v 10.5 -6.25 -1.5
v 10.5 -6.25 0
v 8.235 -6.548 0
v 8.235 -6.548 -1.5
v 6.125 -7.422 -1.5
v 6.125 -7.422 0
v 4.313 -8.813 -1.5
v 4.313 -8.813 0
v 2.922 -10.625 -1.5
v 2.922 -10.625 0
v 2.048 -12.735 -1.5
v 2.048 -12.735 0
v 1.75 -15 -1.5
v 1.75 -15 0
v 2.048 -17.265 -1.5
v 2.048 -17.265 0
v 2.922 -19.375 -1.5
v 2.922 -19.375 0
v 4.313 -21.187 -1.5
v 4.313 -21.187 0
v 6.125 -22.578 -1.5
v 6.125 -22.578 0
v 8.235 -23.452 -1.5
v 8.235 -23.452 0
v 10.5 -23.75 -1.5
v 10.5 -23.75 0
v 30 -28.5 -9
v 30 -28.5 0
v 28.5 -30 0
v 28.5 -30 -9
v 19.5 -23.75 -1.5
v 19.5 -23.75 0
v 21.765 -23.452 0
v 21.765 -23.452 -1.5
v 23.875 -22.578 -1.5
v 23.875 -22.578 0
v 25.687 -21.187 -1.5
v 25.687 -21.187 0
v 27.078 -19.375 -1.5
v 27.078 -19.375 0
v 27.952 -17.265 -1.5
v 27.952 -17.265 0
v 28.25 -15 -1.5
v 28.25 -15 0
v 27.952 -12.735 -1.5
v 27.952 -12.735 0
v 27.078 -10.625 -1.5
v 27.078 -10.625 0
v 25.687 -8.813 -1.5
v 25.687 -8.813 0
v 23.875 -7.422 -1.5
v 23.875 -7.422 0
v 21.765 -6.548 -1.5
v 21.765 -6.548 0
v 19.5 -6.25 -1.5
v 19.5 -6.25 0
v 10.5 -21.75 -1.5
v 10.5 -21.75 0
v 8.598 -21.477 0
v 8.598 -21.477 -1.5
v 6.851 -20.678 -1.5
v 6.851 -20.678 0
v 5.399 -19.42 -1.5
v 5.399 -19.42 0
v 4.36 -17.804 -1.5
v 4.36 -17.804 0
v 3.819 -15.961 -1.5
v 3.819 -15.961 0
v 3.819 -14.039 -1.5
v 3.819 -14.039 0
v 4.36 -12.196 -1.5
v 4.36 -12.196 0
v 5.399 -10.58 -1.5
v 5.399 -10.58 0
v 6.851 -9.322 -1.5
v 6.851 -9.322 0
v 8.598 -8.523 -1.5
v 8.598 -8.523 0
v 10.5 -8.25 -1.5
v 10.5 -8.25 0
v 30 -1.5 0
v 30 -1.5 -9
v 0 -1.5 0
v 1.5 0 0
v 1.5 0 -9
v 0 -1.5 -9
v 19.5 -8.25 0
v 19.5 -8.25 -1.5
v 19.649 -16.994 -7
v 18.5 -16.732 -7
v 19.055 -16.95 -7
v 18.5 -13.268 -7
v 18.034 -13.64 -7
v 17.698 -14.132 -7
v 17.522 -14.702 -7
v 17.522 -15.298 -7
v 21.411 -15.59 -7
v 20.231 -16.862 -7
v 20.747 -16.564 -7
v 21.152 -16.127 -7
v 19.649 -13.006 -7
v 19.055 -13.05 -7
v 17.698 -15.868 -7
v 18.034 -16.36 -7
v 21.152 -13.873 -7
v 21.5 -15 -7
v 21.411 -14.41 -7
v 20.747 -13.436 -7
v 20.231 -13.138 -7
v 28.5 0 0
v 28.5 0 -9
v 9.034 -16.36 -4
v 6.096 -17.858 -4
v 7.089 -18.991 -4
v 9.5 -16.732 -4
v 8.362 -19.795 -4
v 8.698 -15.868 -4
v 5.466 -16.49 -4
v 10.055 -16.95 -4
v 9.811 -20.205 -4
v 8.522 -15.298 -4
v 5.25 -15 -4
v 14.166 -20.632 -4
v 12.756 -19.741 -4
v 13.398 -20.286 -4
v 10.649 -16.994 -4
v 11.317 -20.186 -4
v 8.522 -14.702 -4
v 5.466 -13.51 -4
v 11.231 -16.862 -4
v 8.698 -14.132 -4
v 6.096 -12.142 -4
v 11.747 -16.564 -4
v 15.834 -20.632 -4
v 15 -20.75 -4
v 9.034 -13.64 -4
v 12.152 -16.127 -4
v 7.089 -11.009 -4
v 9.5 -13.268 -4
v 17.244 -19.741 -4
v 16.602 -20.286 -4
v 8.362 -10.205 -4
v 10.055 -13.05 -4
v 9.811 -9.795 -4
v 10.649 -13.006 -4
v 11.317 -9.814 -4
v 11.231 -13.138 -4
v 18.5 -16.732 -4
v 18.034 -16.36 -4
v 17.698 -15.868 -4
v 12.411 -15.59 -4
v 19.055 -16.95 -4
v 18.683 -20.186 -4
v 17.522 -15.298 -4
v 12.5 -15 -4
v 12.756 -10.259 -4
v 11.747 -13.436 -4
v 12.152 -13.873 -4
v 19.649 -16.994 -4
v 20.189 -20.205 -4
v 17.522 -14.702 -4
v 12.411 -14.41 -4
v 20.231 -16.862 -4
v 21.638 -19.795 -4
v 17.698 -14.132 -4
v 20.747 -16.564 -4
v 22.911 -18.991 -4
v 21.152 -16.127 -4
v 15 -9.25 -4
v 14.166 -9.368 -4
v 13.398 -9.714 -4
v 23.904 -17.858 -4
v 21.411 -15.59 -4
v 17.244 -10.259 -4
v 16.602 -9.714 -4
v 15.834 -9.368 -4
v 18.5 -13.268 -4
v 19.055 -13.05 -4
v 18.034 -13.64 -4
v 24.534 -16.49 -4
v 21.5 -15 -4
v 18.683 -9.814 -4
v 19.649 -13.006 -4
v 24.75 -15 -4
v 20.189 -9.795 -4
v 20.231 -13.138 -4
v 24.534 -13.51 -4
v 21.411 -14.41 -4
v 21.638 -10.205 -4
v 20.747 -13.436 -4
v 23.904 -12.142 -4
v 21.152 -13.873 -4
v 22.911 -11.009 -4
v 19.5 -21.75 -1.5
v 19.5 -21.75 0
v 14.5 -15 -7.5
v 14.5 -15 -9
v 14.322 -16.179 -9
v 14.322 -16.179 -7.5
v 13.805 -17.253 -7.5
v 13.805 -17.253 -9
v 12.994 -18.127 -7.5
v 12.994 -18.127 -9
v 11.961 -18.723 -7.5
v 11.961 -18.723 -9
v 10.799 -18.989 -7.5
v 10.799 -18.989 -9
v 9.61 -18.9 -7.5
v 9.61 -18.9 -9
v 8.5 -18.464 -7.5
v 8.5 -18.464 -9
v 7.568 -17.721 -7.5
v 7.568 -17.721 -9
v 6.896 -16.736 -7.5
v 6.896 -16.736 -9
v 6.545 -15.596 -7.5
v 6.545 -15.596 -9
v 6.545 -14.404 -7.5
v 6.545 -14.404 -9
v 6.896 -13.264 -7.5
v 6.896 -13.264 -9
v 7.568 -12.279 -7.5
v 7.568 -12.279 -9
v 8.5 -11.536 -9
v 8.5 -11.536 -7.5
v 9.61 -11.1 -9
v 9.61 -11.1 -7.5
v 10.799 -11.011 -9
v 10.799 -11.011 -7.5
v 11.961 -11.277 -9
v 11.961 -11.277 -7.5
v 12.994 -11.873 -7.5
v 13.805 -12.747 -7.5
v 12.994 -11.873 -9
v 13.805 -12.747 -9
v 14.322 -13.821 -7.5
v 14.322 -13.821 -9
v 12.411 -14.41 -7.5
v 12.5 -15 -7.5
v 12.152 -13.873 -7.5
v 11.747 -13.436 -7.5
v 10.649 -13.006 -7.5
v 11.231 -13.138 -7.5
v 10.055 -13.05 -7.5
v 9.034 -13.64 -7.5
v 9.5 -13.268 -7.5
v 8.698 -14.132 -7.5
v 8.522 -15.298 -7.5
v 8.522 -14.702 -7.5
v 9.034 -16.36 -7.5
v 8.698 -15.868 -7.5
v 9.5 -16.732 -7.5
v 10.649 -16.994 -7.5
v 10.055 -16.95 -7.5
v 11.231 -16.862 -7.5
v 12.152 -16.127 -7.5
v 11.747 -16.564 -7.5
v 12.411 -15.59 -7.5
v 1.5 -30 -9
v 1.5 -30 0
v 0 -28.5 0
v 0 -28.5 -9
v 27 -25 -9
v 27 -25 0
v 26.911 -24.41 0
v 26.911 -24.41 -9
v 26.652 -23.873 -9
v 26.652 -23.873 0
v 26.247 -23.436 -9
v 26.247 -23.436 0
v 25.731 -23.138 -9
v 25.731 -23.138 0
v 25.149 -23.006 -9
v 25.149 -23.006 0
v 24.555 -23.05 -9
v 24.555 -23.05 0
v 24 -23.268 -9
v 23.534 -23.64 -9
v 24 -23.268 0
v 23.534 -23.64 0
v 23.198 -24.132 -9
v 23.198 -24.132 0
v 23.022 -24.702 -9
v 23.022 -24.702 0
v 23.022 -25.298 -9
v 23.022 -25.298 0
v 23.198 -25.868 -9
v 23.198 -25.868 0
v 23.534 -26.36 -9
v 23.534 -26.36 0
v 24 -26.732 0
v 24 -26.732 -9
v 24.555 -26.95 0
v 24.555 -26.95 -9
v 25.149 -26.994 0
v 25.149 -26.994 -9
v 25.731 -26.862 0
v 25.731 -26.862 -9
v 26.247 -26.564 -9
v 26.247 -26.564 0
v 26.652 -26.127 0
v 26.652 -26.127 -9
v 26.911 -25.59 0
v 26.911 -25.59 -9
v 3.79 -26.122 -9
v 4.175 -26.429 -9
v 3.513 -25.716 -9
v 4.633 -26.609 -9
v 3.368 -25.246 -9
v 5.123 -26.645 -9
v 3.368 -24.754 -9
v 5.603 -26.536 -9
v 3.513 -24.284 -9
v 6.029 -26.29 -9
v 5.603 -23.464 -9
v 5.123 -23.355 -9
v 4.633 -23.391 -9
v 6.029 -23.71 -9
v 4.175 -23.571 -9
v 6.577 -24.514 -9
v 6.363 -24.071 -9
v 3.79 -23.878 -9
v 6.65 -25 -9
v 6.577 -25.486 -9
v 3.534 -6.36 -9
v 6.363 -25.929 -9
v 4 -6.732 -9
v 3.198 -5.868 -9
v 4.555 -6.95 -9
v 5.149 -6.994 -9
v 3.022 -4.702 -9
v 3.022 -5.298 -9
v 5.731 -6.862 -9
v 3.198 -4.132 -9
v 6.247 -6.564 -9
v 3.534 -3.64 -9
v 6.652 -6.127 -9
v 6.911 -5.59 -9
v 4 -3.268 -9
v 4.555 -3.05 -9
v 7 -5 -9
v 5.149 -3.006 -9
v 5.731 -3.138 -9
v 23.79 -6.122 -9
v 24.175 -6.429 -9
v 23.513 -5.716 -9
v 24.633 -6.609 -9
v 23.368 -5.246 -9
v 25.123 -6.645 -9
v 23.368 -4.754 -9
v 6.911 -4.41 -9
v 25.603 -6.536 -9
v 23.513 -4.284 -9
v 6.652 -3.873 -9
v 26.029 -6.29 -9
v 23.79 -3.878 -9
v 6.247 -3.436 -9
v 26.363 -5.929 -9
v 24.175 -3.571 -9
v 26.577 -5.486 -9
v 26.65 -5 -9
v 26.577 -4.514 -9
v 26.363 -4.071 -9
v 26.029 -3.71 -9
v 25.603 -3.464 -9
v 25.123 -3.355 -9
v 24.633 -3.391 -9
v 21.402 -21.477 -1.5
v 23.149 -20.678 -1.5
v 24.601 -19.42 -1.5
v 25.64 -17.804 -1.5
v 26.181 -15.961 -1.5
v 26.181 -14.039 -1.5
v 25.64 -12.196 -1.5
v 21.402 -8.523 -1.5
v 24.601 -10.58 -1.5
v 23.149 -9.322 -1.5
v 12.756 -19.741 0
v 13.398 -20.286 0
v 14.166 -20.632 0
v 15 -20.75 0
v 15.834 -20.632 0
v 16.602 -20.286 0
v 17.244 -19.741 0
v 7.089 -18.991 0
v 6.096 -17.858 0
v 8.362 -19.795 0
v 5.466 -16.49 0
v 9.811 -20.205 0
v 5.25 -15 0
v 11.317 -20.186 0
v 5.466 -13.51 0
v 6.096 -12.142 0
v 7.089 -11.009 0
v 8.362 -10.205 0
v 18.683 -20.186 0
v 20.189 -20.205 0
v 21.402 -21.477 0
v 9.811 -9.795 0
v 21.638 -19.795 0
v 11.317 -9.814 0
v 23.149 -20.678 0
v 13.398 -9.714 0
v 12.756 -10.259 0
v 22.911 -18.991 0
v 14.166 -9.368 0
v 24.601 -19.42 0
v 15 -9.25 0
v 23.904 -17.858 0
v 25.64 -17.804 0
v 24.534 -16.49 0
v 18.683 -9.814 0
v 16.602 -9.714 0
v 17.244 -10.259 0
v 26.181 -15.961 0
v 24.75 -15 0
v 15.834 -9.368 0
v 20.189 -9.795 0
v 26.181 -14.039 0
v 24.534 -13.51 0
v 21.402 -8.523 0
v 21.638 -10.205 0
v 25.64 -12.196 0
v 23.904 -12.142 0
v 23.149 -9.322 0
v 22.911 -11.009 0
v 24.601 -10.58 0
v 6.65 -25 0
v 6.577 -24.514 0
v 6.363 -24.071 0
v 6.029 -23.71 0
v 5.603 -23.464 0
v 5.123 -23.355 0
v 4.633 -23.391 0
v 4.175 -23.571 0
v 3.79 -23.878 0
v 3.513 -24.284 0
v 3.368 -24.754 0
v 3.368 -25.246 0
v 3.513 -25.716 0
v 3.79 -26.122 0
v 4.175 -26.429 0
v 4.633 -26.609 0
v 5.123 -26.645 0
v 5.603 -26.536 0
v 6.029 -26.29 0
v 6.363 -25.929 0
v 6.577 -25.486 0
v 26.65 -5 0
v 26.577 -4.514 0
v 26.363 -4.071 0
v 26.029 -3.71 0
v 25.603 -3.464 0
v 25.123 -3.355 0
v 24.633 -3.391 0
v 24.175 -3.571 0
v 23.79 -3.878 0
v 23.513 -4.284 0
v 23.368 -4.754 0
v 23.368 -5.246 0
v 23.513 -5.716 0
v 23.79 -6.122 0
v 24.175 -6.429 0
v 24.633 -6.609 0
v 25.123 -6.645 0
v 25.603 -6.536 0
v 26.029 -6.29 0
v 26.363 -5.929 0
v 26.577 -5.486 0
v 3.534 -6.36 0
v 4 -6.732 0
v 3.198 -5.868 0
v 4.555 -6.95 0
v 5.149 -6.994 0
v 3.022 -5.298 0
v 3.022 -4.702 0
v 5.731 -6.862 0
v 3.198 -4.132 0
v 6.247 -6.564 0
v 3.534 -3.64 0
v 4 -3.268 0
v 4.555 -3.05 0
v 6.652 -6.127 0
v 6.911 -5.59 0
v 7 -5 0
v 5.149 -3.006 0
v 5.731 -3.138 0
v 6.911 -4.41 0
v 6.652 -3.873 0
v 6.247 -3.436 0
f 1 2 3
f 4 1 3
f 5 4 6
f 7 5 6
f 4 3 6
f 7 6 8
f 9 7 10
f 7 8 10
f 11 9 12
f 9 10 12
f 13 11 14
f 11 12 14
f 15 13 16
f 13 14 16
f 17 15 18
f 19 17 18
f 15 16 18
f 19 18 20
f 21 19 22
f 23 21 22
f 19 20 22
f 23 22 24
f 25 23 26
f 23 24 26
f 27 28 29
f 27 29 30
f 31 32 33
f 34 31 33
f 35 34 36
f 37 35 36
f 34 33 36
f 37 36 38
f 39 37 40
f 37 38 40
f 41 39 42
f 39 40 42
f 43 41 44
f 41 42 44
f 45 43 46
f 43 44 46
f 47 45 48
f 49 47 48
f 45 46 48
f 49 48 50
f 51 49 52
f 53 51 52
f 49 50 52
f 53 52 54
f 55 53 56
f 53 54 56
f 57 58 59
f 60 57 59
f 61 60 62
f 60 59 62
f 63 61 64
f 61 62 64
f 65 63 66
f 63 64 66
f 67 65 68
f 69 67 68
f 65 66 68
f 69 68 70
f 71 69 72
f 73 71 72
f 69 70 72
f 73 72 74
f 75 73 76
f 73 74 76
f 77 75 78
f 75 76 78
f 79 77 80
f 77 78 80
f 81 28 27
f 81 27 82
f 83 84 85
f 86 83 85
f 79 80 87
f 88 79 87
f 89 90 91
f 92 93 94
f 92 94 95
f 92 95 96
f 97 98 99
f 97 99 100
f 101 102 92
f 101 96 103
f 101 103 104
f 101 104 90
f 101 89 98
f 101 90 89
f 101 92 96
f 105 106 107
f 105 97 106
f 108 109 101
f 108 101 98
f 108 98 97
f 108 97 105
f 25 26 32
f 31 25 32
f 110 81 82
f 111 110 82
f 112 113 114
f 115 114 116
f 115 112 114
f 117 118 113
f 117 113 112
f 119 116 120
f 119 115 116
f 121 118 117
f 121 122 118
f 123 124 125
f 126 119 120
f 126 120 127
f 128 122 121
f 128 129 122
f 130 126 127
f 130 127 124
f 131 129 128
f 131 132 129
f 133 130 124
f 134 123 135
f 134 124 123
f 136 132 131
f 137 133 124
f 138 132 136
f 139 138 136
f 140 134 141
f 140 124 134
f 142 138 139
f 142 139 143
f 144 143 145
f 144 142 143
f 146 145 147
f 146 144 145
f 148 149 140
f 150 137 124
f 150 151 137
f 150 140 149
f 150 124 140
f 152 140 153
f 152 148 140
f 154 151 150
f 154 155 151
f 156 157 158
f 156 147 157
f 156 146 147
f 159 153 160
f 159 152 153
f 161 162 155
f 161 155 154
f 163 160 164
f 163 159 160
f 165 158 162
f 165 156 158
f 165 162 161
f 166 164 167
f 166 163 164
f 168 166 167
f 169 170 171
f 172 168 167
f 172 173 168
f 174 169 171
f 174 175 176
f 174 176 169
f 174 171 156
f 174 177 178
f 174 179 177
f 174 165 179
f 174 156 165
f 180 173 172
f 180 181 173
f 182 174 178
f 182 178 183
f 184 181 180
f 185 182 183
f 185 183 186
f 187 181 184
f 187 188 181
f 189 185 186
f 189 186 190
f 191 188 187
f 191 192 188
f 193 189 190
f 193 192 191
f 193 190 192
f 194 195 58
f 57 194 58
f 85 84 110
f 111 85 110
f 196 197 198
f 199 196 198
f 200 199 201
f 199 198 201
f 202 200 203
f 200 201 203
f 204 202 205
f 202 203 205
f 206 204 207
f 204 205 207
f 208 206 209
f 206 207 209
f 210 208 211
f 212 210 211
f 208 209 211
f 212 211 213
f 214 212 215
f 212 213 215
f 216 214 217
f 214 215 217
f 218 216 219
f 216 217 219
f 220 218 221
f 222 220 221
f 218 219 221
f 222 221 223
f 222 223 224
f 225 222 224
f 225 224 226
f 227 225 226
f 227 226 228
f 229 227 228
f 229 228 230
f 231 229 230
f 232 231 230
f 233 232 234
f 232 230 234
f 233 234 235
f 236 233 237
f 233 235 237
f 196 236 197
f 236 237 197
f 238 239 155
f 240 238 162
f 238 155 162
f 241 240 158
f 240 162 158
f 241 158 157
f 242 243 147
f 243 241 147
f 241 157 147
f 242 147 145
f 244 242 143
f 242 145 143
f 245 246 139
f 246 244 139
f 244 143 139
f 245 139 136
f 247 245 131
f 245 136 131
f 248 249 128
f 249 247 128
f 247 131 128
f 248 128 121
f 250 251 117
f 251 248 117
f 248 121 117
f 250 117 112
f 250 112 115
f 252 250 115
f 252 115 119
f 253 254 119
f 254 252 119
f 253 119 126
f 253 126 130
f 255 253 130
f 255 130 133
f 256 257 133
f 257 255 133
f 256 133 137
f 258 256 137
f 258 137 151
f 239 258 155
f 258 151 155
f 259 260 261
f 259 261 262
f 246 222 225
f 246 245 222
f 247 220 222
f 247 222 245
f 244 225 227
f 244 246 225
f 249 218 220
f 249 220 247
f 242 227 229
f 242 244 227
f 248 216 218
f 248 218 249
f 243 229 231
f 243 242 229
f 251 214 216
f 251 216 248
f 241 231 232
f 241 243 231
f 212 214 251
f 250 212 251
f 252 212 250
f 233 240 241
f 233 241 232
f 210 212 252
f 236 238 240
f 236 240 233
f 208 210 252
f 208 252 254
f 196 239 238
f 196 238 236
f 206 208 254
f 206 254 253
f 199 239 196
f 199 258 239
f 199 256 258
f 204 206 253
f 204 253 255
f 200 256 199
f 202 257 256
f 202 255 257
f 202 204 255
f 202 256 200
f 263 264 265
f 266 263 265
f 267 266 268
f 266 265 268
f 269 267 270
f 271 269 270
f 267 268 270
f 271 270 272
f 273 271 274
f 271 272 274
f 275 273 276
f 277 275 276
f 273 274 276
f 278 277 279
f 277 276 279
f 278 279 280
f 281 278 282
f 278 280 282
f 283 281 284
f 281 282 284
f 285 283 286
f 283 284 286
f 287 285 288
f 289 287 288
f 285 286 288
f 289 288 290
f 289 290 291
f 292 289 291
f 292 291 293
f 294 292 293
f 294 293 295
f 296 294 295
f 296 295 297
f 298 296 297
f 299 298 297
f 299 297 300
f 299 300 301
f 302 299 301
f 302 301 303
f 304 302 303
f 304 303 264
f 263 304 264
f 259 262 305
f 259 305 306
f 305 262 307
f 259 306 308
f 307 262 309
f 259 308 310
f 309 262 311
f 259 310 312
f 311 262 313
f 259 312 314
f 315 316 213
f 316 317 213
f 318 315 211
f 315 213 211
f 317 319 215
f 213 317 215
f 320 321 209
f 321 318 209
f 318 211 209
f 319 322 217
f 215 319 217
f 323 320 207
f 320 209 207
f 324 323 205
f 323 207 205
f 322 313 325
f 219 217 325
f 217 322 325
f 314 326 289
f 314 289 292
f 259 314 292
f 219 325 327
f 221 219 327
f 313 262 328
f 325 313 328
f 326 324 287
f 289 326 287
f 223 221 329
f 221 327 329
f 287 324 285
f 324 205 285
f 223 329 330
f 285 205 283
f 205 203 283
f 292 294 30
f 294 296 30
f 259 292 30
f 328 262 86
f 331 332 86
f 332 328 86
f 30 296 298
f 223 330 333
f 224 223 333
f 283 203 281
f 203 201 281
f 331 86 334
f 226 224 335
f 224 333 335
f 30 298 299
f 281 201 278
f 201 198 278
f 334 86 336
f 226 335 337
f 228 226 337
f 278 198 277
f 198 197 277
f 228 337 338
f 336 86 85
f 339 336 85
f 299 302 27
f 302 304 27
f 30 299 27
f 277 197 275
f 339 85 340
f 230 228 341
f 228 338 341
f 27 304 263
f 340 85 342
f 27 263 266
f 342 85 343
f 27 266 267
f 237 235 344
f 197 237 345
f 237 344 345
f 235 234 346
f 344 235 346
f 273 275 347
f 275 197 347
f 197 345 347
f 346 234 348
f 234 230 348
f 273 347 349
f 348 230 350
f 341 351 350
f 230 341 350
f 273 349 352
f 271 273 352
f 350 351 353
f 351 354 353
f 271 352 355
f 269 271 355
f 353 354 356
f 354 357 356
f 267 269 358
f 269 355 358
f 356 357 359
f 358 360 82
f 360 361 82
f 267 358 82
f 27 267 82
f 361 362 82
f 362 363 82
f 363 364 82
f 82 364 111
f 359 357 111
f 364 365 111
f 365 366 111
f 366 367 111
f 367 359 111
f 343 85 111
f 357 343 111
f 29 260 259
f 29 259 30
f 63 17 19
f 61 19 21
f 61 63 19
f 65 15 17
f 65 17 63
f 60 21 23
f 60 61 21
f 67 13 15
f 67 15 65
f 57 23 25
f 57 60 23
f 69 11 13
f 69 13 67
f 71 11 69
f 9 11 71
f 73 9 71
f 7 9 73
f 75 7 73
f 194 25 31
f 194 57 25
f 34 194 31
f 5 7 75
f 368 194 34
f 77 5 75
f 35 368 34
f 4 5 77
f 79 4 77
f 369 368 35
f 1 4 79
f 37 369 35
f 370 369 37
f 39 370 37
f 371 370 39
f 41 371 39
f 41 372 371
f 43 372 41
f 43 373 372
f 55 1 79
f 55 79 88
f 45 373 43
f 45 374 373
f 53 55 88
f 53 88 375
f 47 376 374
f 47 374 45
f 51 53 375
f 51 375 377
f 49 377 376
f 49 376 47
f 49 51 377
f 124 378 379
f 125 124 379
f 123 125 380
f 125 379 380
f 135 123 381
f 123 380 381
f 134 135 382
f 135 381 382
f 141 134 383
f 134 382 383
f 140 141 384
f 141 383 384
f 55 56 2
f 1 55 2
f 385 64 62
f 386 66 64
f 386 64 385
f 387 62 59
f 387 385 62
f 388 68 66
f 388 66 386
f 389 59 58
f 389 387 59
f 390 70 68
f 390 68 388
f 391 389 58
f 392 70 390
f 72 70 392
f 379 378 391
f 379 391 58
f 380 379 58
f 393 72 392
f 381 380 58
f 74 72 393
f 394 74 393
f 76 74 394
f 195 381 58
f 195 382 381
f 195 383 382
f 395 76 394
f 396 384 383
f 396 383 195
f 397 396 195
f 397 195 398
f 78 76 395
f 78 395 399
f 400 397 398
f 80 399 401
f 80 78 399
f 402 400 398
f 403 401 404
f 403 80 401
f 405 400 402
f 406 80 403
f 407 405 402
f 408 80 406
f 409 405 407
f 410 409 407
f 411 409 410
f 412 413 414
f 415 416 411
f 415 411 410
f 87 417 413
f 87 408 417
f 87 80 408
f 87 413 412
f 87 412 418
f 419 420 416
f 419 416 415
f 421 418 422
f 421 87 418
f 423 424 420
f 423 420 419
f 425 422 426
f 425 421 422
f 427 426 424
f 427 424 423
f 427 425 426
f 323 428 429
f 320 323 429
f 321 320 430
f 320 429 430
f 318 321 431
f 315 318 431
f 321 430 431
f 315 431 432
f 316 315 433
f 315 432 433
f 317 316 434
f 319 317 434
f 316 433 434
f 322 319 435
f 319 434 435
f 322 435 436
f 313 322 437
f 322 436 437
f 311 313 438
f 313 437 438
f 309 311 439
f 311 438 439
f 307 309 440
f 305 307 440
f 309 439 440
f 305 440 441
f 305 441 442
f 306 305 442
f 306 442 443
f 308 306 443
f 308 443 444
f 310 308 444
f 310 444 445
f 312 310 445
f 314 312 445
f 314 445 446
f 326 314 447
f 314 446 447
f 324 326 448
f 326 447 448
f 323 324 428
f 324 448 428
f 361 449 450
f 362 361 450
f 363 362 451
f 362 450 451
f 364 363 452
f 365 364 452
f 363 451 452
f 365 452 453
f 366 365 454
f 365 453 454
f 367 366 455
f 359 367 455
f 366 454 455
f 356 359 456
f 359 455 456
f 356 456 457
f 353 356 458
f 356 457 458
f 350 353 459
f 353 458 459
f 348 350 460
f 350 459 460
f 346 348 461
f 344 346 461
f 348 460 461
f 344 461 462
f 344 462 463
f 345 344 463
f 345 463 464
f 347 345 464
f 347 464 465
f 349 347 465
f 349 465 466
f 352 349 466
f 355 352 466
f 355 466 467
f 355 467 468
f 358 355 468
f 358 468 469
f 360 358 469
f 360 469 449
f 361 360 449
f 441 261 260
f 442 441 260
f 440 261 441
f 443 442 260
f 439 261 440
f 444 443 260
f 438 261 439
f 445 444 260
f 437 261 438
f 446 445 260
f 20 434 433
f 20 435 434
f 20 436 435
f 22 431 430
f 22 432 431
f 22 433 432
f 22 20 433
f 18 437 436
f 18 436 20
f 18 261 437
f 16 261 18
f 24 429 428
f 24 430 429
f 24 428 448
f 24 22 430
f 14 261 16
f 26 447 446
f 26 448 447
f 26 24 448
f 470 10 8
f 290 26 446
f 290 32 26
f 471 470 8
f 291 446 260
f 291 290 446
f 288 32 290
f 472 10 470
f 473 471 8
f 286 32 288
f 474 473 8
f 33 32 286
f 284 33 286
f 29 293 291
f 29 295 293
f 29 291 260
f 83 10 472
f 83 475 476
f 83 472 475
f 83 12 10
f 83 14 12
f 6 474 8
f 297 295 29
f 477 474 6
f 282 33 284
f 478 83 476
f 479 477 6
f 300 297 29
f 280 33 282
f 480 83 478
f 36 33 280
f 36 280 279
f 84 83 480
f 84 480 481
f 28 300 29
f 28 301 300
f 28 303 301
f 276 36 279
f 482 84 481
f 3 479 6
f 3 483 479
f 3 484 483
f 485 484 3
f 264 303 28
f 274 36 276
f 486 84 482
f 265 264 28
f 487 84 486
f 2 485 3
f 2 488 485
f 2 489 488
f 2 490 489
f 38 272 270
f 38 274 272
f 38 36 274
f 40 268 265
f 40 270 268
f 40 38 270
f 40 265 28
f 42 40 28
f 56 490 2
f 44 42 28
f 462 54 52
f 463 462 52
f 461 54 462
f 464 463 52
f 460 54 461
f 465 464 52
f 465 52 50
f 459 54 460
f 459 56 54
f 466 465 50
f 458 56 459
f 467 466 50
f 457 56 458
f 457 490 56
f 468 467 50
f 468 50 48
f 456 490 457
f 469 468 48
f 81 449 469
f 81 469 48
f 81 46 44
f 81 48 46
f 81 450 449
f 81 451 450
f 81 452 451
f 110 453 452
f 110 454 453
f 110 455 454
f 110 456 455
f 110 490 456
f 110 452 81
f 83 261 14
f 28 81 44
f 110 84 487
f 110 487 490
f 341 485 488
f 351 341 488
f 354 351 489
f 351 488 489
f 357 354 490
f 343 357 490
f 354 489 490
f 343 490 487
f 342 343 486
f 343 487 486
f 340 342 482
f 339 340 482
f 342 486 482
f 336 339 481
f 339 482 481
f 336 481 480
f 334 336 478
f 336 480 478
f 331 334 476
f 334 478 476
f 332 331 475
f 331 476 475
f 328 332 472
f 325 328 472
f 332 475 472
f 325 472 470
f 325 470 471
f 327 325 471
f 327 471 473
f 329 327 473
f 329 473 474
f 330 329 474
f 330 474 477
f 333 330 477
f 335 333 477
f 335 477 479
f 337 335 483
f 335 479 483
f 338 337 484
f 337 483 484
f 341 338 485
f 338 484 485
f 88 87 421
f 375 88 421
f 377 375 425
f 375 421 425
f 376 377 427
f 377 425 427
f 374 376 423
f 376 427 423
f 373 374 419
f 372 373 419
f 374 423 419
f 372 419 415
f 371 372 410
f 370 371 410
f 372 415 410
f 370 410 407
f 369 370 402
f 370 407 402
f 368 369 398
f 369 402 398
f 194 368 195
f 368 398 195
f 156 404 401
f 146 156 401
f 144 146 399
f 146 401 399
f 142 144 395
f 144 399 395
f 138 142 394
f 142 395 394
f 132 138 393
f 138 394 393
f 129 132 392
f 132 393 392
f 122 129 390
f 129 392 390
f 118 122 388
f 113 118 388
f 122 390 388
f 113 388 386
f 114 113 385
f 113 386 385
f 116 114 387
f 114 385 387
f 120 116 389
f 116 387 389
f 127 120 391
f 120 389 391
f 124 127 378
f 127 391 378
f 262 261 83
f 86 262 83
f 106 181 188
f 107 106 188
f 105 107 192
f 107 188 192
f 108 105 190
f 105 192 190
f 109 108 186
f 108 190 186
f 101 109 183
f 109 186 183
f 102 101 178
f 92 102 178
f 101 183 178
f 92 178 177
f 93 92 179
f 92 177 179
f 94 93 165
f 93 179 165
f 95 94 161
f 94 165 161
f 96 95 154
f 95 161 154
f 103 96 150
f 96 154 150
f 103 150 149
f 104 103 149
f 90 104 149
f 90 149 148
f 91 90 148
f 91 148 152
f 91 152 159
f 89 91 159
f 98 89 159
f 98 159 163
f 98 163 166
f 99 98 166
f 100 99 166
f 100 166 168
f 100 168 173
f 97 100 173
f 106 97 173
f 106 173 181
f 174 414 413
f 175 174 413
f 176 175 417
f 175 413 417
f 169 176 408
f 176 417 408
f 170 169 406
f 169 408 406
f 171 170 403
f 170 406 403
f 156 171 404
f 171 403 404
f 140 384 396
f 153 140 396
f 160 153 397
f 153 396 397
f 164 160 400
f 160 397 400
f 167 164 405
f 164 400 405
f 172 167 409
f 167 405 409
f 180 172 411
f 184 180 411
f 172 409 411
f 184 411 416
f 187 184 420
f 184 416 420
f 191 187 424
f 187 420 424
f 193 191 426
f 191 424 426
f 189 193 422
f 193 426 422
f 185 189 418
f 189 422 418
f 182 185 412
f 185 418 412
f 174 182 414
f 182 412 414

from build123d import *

# Parameters (mm, degrees)
F0_W     = 30
F0_H     = 30
F0_R     = 1.65
F0_R_2   = 2
F1_DEPTH = 9
F2_DEPTH = 1.5
F3_DEPTH = 7
F4_DEPTH = 4
F5_R     = 4
F5_R_2   = 2
F6_DEPTH = 1.5
F7_DEPTH = 10
F8_SIZE  = 1.5


# Not quite as in the source:
# - a feature names something its author has since deleted; it is built from what else it names


with BuildPart() as f1:
    # F0 (on Top) → F1 (new body)
    with BuildSketch(Plane.XY):
        with Locations((15, -15)):
            Rectangle(F0_W, F0_H)
        with Locations((5, -25)):
            Circle(F0_R, mode=Mode.SUBTRACT)
        with Locations((25, -25)):
            Circle(F0_R_2, mode=Mode.SUBTRACT)
        with Locations((5, -5)):
            Circle(F0_R_2, mode=Mode.SUBTRACT)
        with BuildLine():
            Line((19.5, -23.75), (10.5, -23.75))
            ThreePointArc((10.5, -23.75), (1.75, -15), (10.5, -6.25))
            Line((10.5, -6.25), (19.5, -6.25))
            ThreePointArc((19.5, -6.25), (28.25, -15), (19.5, -23.75))
        make_face(mode=Mode.SUBTRACT)
        with Locations((25, -5)):
            Circle(F0_R, mode=Mode.SUBTRACT)
        with BuildLine():
            ThreePointArc((10.5, -6.25), (1.75, -15), (10.5, -23.75))
            Line((10.5, -23.75), (19.5, -23.75))
            ThreePointArc((19.5, -23.75), (28.25, -15), (19.5, -6.25))
            Line((19.5, -6.25), (10.5, -6.25))
        make_face()
        with BuildLine():
            ThreePointArc((10.5, -21.75), (3.75, -15), (10.5, -8.25))
            Line((10.5, -8.25), (19.5, -8.25))
            ThreePointArc((19.5, -8.25), (26.25, -15), (19.5, -21.75))
            Line((19.5, -21.75), (10.5, -21.75))
        make_face(mode=Mode.SUBTRACT)
        with BuildLine():
            Line((19.5, -8.25), (10.5, -8.25))
            ThreePointArc((10.5, -8.25), (3.75, -15), (10.5, -21.75))
            Line((10.5, -21.75), (19.5, -21.75))
            ThreePointArc((19.5, -21.75), (26.25, -15), (19.5, -8.25))
        make_face()
        with BuildLine():
            ThreePointArc((17.2443308628, -10.25927677), (24.75, -15), (17.2443308628, -19.74072323))
            ThreePointArc((17.2443308628, -19.74072323), (15, -20.75), (12.7556691372, -19.74072323))
            ThreePointArc((12.7556691372, -19.74072323), (5.25, -15), (12.7556691372, -10.25927677))
            ThreePointArc((12.7556691372, -10.25927677), (15, -9.25), (17.2443308628, -10.25927677))
        make_face(mode=Mode.SUBTRACT)
        with BuildLine():
            ThreePointArc((12.7556691372, -19.74072323), (15, -20.75), (17.2443308628, -19.74072323))
            ThreePointArc((17.2443308628, -19.74072323), (24.75, -15), (17.2443308628, -10.25927677))
            ThreePointArc((17.2443308628, -10.25927677), (15, -9.25), (12.7556691372, -10.25927677))
            ThreePointArc((12.7556691372, -10.25927677), (5.25, -15), (12.7556691372, -19.74072323))
        make_face()
        with Locations((10.5, -15)):
            Circle(F0_R_2, mode=Mode.SUBTRACT)
        with Locations((19.5, -15)):
            Circle(F0_R_2, mode=Mode.SUBTRACT)
        with Locations((19.5, -15)):
            Circle(F0_R_2)
        with Locations((25, -25)):
            Circle(F0_R_2)
        with Locations((25, -5)):
            Circle(F0_R)
    extrude(amount=-F1_DEPTH)

    # F0 (on Top) → F2 (cut)
    with BuildSketch(Plane.XY):
        with BuildLine():
            ThreePointArc((10.5, -6.25), (1.75, -15), (10.5, -23.75))
            Line((10.5, -23.75), (19.5, -23.75))
            ThreePointArc((19.5, -23.75), (28.25, -15), (19.5, -6.25))
            Line((19.5, -6.25), (10.5, -6.25))
        make_face()
        with BuildLine():
            ThreePointArc((10.5, -21.75), (3.75, -15), (10.5, -8.25))
            Line((10.5, -8.25), (19.5, -8.25))
            ThreePointArc((19.5, -8.25), (26.25, -15), (19.5, -21.75))
            Line((19.5, -21.75), (10.5, -21.75))
        make_face(mode=Mode.SUBTRACT)
    extrude(amount=-F2_DEPTH, mode=Mode.SUBTRACT)

    # F0 (on Top) → F3 (cut)
    with BuildSketch(Plane.XY):
        with Locations((19.5, -15)):
            Circle(F0_R_2)
    extrude(amount=-F3_DEPTH, mode=Mode.SUBTRACT)

    # F0 (on Top) → F4 (cut)
    with BuildSketch(Plane.XY):
        with BuildLine():
            ThreePointArc((12.7556691372, -19.74072323), (15, -20.75), (17.2443308628, -19.74072323))
            ThreePointArc((17.2443308628, -19.74072323), (24.75, -15), (17.2443308628, -10.25927677))
            ThreePointArc((17.2443308628, -10.25927677), (15, -9.25), (12.7556691372, -10.25927677))
            ThreePointArc((12.7556691372, -10.25927677), (5.25, -15), (12.7556691372, -19.74072323))
        make_face()
        with Locations((10.5, -15)):
            Circle(F0_R_2, mode=Mode.SUBTRACT)
        with Locations((19.5, -15)):
            Circle(F0_R_2, mode=Mode.SUBTRACT)
    extrude(amount=-F4_DEPTH, mode=Mode.SUBTRACT)

    # F5 (on face) → F6 (cut)
    with BuildSketch(Plane(origin=(0, 0, -9), x_dir=(1, 0, 0), z_dir=(0, 0, -1))):
        with Locations((10.5, 15)):
            Circle(F5_R)
        with Locations((10.5, 15)):
            Circle(F5_R_2, mode=Mode.SUBTRACT)
    extrude(amount=-F6_DEPTH, mode=Mode.SUBTRACT)

    # F0 (on Top) → F7 (cut)
    with BuildSketch(Plane.XY):
        with Locations((25, -25)):
            Circle(F0_R_2)
        with Locations((25, -5)):
            Circle(F0_R)
    extrude(amount=-F7_DEPTH, mode=Mode.SUBTRACT)

    # F8
    f8_edges = [f1.edges().sort_by_distance(p)[0] for p in [
        (30, -30, -4.5),
        (30, 0, -4.5),
        (0, -30, -4.5),
        (0, 0, -4.5),
    ]]
    chamfer(f8_edges, length=F8_SIZE)


solid = f1.part
